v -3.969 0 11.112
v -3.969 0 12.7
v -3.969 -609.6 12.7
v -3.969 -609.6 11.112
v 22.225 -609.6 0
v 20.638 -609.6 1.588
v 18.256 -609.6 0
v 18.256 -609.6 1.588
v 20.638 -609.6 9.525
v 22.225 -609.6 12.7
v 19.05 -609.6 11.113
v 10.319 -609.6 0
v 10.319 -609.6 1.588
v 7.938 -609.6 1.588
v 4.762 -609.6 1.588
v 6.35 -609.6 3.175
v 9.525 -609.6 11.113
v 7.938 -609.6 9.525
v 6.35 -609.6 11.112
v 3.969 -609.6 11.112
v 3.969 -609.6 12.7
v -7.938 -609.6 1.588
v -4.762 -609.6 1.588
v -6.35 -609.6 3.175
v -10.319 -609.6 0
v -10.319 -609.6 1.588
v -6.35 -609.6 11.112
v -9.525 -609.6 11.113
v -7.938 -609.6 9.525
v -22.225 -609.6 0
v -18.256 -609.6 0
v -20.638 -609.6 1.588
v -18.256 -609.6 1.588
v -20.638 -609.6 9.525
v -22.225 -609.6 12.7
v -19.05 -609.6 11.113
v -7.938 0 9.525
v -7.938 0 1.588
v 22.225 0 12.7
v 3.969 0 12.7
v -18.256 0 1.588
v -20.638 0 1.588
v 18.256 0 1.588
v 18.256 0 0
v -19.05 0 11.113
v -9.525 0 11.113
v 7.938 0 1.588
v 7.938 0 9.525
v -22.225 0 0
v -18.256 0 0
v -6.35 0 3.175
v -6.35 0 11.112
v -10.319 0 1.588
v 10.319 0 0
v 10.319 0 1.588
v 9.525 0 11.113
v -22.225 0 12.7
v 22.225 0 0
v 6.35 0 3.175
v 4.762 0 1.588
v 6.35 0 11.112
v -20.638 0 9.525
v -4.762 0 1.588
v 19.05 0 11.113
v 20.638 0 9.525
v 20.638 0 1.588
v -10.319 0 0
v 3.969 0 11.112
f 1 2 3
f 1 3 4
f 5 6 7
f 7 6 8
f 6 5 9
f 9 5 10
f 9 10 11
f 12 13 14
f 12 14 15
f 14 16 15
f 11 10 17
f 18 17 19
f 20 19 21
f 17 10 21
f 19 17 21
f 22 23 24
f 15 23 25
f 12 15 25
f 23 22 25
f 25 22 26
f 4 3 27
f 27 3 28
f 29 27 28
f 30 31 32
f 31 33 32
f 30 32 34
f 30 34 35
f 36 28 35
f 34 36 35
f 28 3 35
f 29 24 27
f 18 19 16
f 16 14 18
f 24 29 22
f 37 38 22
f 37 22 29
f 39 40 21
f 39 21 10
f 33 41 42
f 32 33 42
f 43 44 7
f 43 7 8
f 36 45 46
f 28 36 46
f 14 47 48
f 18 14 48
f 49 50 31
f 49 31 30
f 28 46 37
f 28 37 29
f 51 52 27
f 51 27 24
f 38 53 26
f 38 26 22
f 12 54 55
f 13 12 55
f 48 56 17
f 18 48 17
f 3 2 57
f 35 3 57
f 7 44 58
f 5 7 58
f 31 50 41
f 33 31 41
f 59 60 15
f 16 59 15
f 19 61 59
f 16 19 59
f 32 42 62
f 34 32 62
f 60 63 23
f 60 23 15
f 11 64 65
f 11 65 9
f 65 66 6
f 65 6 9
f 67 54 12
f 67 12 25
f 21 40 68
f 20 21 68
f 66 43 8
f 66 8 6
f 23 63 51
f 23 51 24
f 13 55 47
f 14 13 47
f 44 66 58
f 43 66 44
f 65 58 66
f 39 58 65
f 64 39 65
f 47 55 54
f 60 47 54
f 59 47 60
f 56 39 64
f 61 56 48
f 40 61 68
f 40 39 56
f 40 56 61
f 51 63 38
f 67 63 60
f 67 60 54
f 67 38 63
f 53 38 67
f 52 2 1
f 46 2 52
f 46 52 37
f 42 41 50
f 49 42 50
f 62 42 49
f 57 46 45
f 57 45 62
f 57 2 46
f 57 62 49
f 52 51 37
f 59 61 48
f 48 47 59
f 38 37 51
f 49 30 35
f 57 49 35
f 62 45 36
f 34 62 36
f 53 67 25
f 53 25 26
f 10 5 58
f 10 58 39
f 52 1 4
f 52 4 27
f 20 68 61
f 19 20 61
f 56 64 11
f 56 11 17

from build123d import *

# Parameters (mm, degrees)
F1_DEPTH = 609.6
F2_SIZE  = 1.5875
F5_W     = 34.925
F5_H     = 12.7
F6_DEPTH = 609.601


with BuildPart() as f1:
    # F0 (on Front) → F1 (new body)
    with BuildSketch(Plane.XZ):
        Polygon((0, 1.5875), (0, 0), (10.31875, 0), (10.31875, 1.5875), (7.9375, 1.5875), (7.9375, 11.1125), (14.2875, 11.1125), (14.2875, 12.7), (3.96875, 12.7), (3.96875, 11.1125), (6.35, 11.1125), (6.35, 1.5875), align=None)
    extrude(amount=F1_DEPTH)

    # F2
    f2_edges = [f1.edges().sort_by_distance(p)[0] for p in [
        (6.35, -304.8, 1.5875),
        (7.9375, -304.8, 11.1125),
    ]]
    chamfer(f2_edges, length=F2_SIZE)

    # F3: F1 across face


with BuildPart() as f1_1:
    add(f1.part)
    add(f1.part.mirror(Plane(origin=(14.2875, -304.8, 11.90625), x_dir=(0, 1, 0), z_dir=(1, 0, 0))))

    # F4: F1 across face


with BuildPart() as f1_2:
    add(f1_1.part)
    add(f1_1.part.mirror(Plane(origin=(28.575, -304.8, 0.79375), x_dir=(0, 1, 0), z_dir=(1, 0, 0))))

    # F5 (on face) → F6 (cut, through all)
    with BuildSketch(Plane.XZ.offset(609.6)):
        with Locations((39.6875, 6.35)):
            Rectangle(F5_W, F5_H)
    extrude(amount=-F6_DEPTH, mode=Mode.SUBTRACT)

    # F7: F1 across face


with BuildPart() as f1_3:
    add(f1_2.part)
    add(f1_2.part.mirror(Plane(origin=(0, -304.8, 0.79375), x_dir=(0, -1, 0), z_dir=(-1, 0, 0))))


solid = f1_3.part
